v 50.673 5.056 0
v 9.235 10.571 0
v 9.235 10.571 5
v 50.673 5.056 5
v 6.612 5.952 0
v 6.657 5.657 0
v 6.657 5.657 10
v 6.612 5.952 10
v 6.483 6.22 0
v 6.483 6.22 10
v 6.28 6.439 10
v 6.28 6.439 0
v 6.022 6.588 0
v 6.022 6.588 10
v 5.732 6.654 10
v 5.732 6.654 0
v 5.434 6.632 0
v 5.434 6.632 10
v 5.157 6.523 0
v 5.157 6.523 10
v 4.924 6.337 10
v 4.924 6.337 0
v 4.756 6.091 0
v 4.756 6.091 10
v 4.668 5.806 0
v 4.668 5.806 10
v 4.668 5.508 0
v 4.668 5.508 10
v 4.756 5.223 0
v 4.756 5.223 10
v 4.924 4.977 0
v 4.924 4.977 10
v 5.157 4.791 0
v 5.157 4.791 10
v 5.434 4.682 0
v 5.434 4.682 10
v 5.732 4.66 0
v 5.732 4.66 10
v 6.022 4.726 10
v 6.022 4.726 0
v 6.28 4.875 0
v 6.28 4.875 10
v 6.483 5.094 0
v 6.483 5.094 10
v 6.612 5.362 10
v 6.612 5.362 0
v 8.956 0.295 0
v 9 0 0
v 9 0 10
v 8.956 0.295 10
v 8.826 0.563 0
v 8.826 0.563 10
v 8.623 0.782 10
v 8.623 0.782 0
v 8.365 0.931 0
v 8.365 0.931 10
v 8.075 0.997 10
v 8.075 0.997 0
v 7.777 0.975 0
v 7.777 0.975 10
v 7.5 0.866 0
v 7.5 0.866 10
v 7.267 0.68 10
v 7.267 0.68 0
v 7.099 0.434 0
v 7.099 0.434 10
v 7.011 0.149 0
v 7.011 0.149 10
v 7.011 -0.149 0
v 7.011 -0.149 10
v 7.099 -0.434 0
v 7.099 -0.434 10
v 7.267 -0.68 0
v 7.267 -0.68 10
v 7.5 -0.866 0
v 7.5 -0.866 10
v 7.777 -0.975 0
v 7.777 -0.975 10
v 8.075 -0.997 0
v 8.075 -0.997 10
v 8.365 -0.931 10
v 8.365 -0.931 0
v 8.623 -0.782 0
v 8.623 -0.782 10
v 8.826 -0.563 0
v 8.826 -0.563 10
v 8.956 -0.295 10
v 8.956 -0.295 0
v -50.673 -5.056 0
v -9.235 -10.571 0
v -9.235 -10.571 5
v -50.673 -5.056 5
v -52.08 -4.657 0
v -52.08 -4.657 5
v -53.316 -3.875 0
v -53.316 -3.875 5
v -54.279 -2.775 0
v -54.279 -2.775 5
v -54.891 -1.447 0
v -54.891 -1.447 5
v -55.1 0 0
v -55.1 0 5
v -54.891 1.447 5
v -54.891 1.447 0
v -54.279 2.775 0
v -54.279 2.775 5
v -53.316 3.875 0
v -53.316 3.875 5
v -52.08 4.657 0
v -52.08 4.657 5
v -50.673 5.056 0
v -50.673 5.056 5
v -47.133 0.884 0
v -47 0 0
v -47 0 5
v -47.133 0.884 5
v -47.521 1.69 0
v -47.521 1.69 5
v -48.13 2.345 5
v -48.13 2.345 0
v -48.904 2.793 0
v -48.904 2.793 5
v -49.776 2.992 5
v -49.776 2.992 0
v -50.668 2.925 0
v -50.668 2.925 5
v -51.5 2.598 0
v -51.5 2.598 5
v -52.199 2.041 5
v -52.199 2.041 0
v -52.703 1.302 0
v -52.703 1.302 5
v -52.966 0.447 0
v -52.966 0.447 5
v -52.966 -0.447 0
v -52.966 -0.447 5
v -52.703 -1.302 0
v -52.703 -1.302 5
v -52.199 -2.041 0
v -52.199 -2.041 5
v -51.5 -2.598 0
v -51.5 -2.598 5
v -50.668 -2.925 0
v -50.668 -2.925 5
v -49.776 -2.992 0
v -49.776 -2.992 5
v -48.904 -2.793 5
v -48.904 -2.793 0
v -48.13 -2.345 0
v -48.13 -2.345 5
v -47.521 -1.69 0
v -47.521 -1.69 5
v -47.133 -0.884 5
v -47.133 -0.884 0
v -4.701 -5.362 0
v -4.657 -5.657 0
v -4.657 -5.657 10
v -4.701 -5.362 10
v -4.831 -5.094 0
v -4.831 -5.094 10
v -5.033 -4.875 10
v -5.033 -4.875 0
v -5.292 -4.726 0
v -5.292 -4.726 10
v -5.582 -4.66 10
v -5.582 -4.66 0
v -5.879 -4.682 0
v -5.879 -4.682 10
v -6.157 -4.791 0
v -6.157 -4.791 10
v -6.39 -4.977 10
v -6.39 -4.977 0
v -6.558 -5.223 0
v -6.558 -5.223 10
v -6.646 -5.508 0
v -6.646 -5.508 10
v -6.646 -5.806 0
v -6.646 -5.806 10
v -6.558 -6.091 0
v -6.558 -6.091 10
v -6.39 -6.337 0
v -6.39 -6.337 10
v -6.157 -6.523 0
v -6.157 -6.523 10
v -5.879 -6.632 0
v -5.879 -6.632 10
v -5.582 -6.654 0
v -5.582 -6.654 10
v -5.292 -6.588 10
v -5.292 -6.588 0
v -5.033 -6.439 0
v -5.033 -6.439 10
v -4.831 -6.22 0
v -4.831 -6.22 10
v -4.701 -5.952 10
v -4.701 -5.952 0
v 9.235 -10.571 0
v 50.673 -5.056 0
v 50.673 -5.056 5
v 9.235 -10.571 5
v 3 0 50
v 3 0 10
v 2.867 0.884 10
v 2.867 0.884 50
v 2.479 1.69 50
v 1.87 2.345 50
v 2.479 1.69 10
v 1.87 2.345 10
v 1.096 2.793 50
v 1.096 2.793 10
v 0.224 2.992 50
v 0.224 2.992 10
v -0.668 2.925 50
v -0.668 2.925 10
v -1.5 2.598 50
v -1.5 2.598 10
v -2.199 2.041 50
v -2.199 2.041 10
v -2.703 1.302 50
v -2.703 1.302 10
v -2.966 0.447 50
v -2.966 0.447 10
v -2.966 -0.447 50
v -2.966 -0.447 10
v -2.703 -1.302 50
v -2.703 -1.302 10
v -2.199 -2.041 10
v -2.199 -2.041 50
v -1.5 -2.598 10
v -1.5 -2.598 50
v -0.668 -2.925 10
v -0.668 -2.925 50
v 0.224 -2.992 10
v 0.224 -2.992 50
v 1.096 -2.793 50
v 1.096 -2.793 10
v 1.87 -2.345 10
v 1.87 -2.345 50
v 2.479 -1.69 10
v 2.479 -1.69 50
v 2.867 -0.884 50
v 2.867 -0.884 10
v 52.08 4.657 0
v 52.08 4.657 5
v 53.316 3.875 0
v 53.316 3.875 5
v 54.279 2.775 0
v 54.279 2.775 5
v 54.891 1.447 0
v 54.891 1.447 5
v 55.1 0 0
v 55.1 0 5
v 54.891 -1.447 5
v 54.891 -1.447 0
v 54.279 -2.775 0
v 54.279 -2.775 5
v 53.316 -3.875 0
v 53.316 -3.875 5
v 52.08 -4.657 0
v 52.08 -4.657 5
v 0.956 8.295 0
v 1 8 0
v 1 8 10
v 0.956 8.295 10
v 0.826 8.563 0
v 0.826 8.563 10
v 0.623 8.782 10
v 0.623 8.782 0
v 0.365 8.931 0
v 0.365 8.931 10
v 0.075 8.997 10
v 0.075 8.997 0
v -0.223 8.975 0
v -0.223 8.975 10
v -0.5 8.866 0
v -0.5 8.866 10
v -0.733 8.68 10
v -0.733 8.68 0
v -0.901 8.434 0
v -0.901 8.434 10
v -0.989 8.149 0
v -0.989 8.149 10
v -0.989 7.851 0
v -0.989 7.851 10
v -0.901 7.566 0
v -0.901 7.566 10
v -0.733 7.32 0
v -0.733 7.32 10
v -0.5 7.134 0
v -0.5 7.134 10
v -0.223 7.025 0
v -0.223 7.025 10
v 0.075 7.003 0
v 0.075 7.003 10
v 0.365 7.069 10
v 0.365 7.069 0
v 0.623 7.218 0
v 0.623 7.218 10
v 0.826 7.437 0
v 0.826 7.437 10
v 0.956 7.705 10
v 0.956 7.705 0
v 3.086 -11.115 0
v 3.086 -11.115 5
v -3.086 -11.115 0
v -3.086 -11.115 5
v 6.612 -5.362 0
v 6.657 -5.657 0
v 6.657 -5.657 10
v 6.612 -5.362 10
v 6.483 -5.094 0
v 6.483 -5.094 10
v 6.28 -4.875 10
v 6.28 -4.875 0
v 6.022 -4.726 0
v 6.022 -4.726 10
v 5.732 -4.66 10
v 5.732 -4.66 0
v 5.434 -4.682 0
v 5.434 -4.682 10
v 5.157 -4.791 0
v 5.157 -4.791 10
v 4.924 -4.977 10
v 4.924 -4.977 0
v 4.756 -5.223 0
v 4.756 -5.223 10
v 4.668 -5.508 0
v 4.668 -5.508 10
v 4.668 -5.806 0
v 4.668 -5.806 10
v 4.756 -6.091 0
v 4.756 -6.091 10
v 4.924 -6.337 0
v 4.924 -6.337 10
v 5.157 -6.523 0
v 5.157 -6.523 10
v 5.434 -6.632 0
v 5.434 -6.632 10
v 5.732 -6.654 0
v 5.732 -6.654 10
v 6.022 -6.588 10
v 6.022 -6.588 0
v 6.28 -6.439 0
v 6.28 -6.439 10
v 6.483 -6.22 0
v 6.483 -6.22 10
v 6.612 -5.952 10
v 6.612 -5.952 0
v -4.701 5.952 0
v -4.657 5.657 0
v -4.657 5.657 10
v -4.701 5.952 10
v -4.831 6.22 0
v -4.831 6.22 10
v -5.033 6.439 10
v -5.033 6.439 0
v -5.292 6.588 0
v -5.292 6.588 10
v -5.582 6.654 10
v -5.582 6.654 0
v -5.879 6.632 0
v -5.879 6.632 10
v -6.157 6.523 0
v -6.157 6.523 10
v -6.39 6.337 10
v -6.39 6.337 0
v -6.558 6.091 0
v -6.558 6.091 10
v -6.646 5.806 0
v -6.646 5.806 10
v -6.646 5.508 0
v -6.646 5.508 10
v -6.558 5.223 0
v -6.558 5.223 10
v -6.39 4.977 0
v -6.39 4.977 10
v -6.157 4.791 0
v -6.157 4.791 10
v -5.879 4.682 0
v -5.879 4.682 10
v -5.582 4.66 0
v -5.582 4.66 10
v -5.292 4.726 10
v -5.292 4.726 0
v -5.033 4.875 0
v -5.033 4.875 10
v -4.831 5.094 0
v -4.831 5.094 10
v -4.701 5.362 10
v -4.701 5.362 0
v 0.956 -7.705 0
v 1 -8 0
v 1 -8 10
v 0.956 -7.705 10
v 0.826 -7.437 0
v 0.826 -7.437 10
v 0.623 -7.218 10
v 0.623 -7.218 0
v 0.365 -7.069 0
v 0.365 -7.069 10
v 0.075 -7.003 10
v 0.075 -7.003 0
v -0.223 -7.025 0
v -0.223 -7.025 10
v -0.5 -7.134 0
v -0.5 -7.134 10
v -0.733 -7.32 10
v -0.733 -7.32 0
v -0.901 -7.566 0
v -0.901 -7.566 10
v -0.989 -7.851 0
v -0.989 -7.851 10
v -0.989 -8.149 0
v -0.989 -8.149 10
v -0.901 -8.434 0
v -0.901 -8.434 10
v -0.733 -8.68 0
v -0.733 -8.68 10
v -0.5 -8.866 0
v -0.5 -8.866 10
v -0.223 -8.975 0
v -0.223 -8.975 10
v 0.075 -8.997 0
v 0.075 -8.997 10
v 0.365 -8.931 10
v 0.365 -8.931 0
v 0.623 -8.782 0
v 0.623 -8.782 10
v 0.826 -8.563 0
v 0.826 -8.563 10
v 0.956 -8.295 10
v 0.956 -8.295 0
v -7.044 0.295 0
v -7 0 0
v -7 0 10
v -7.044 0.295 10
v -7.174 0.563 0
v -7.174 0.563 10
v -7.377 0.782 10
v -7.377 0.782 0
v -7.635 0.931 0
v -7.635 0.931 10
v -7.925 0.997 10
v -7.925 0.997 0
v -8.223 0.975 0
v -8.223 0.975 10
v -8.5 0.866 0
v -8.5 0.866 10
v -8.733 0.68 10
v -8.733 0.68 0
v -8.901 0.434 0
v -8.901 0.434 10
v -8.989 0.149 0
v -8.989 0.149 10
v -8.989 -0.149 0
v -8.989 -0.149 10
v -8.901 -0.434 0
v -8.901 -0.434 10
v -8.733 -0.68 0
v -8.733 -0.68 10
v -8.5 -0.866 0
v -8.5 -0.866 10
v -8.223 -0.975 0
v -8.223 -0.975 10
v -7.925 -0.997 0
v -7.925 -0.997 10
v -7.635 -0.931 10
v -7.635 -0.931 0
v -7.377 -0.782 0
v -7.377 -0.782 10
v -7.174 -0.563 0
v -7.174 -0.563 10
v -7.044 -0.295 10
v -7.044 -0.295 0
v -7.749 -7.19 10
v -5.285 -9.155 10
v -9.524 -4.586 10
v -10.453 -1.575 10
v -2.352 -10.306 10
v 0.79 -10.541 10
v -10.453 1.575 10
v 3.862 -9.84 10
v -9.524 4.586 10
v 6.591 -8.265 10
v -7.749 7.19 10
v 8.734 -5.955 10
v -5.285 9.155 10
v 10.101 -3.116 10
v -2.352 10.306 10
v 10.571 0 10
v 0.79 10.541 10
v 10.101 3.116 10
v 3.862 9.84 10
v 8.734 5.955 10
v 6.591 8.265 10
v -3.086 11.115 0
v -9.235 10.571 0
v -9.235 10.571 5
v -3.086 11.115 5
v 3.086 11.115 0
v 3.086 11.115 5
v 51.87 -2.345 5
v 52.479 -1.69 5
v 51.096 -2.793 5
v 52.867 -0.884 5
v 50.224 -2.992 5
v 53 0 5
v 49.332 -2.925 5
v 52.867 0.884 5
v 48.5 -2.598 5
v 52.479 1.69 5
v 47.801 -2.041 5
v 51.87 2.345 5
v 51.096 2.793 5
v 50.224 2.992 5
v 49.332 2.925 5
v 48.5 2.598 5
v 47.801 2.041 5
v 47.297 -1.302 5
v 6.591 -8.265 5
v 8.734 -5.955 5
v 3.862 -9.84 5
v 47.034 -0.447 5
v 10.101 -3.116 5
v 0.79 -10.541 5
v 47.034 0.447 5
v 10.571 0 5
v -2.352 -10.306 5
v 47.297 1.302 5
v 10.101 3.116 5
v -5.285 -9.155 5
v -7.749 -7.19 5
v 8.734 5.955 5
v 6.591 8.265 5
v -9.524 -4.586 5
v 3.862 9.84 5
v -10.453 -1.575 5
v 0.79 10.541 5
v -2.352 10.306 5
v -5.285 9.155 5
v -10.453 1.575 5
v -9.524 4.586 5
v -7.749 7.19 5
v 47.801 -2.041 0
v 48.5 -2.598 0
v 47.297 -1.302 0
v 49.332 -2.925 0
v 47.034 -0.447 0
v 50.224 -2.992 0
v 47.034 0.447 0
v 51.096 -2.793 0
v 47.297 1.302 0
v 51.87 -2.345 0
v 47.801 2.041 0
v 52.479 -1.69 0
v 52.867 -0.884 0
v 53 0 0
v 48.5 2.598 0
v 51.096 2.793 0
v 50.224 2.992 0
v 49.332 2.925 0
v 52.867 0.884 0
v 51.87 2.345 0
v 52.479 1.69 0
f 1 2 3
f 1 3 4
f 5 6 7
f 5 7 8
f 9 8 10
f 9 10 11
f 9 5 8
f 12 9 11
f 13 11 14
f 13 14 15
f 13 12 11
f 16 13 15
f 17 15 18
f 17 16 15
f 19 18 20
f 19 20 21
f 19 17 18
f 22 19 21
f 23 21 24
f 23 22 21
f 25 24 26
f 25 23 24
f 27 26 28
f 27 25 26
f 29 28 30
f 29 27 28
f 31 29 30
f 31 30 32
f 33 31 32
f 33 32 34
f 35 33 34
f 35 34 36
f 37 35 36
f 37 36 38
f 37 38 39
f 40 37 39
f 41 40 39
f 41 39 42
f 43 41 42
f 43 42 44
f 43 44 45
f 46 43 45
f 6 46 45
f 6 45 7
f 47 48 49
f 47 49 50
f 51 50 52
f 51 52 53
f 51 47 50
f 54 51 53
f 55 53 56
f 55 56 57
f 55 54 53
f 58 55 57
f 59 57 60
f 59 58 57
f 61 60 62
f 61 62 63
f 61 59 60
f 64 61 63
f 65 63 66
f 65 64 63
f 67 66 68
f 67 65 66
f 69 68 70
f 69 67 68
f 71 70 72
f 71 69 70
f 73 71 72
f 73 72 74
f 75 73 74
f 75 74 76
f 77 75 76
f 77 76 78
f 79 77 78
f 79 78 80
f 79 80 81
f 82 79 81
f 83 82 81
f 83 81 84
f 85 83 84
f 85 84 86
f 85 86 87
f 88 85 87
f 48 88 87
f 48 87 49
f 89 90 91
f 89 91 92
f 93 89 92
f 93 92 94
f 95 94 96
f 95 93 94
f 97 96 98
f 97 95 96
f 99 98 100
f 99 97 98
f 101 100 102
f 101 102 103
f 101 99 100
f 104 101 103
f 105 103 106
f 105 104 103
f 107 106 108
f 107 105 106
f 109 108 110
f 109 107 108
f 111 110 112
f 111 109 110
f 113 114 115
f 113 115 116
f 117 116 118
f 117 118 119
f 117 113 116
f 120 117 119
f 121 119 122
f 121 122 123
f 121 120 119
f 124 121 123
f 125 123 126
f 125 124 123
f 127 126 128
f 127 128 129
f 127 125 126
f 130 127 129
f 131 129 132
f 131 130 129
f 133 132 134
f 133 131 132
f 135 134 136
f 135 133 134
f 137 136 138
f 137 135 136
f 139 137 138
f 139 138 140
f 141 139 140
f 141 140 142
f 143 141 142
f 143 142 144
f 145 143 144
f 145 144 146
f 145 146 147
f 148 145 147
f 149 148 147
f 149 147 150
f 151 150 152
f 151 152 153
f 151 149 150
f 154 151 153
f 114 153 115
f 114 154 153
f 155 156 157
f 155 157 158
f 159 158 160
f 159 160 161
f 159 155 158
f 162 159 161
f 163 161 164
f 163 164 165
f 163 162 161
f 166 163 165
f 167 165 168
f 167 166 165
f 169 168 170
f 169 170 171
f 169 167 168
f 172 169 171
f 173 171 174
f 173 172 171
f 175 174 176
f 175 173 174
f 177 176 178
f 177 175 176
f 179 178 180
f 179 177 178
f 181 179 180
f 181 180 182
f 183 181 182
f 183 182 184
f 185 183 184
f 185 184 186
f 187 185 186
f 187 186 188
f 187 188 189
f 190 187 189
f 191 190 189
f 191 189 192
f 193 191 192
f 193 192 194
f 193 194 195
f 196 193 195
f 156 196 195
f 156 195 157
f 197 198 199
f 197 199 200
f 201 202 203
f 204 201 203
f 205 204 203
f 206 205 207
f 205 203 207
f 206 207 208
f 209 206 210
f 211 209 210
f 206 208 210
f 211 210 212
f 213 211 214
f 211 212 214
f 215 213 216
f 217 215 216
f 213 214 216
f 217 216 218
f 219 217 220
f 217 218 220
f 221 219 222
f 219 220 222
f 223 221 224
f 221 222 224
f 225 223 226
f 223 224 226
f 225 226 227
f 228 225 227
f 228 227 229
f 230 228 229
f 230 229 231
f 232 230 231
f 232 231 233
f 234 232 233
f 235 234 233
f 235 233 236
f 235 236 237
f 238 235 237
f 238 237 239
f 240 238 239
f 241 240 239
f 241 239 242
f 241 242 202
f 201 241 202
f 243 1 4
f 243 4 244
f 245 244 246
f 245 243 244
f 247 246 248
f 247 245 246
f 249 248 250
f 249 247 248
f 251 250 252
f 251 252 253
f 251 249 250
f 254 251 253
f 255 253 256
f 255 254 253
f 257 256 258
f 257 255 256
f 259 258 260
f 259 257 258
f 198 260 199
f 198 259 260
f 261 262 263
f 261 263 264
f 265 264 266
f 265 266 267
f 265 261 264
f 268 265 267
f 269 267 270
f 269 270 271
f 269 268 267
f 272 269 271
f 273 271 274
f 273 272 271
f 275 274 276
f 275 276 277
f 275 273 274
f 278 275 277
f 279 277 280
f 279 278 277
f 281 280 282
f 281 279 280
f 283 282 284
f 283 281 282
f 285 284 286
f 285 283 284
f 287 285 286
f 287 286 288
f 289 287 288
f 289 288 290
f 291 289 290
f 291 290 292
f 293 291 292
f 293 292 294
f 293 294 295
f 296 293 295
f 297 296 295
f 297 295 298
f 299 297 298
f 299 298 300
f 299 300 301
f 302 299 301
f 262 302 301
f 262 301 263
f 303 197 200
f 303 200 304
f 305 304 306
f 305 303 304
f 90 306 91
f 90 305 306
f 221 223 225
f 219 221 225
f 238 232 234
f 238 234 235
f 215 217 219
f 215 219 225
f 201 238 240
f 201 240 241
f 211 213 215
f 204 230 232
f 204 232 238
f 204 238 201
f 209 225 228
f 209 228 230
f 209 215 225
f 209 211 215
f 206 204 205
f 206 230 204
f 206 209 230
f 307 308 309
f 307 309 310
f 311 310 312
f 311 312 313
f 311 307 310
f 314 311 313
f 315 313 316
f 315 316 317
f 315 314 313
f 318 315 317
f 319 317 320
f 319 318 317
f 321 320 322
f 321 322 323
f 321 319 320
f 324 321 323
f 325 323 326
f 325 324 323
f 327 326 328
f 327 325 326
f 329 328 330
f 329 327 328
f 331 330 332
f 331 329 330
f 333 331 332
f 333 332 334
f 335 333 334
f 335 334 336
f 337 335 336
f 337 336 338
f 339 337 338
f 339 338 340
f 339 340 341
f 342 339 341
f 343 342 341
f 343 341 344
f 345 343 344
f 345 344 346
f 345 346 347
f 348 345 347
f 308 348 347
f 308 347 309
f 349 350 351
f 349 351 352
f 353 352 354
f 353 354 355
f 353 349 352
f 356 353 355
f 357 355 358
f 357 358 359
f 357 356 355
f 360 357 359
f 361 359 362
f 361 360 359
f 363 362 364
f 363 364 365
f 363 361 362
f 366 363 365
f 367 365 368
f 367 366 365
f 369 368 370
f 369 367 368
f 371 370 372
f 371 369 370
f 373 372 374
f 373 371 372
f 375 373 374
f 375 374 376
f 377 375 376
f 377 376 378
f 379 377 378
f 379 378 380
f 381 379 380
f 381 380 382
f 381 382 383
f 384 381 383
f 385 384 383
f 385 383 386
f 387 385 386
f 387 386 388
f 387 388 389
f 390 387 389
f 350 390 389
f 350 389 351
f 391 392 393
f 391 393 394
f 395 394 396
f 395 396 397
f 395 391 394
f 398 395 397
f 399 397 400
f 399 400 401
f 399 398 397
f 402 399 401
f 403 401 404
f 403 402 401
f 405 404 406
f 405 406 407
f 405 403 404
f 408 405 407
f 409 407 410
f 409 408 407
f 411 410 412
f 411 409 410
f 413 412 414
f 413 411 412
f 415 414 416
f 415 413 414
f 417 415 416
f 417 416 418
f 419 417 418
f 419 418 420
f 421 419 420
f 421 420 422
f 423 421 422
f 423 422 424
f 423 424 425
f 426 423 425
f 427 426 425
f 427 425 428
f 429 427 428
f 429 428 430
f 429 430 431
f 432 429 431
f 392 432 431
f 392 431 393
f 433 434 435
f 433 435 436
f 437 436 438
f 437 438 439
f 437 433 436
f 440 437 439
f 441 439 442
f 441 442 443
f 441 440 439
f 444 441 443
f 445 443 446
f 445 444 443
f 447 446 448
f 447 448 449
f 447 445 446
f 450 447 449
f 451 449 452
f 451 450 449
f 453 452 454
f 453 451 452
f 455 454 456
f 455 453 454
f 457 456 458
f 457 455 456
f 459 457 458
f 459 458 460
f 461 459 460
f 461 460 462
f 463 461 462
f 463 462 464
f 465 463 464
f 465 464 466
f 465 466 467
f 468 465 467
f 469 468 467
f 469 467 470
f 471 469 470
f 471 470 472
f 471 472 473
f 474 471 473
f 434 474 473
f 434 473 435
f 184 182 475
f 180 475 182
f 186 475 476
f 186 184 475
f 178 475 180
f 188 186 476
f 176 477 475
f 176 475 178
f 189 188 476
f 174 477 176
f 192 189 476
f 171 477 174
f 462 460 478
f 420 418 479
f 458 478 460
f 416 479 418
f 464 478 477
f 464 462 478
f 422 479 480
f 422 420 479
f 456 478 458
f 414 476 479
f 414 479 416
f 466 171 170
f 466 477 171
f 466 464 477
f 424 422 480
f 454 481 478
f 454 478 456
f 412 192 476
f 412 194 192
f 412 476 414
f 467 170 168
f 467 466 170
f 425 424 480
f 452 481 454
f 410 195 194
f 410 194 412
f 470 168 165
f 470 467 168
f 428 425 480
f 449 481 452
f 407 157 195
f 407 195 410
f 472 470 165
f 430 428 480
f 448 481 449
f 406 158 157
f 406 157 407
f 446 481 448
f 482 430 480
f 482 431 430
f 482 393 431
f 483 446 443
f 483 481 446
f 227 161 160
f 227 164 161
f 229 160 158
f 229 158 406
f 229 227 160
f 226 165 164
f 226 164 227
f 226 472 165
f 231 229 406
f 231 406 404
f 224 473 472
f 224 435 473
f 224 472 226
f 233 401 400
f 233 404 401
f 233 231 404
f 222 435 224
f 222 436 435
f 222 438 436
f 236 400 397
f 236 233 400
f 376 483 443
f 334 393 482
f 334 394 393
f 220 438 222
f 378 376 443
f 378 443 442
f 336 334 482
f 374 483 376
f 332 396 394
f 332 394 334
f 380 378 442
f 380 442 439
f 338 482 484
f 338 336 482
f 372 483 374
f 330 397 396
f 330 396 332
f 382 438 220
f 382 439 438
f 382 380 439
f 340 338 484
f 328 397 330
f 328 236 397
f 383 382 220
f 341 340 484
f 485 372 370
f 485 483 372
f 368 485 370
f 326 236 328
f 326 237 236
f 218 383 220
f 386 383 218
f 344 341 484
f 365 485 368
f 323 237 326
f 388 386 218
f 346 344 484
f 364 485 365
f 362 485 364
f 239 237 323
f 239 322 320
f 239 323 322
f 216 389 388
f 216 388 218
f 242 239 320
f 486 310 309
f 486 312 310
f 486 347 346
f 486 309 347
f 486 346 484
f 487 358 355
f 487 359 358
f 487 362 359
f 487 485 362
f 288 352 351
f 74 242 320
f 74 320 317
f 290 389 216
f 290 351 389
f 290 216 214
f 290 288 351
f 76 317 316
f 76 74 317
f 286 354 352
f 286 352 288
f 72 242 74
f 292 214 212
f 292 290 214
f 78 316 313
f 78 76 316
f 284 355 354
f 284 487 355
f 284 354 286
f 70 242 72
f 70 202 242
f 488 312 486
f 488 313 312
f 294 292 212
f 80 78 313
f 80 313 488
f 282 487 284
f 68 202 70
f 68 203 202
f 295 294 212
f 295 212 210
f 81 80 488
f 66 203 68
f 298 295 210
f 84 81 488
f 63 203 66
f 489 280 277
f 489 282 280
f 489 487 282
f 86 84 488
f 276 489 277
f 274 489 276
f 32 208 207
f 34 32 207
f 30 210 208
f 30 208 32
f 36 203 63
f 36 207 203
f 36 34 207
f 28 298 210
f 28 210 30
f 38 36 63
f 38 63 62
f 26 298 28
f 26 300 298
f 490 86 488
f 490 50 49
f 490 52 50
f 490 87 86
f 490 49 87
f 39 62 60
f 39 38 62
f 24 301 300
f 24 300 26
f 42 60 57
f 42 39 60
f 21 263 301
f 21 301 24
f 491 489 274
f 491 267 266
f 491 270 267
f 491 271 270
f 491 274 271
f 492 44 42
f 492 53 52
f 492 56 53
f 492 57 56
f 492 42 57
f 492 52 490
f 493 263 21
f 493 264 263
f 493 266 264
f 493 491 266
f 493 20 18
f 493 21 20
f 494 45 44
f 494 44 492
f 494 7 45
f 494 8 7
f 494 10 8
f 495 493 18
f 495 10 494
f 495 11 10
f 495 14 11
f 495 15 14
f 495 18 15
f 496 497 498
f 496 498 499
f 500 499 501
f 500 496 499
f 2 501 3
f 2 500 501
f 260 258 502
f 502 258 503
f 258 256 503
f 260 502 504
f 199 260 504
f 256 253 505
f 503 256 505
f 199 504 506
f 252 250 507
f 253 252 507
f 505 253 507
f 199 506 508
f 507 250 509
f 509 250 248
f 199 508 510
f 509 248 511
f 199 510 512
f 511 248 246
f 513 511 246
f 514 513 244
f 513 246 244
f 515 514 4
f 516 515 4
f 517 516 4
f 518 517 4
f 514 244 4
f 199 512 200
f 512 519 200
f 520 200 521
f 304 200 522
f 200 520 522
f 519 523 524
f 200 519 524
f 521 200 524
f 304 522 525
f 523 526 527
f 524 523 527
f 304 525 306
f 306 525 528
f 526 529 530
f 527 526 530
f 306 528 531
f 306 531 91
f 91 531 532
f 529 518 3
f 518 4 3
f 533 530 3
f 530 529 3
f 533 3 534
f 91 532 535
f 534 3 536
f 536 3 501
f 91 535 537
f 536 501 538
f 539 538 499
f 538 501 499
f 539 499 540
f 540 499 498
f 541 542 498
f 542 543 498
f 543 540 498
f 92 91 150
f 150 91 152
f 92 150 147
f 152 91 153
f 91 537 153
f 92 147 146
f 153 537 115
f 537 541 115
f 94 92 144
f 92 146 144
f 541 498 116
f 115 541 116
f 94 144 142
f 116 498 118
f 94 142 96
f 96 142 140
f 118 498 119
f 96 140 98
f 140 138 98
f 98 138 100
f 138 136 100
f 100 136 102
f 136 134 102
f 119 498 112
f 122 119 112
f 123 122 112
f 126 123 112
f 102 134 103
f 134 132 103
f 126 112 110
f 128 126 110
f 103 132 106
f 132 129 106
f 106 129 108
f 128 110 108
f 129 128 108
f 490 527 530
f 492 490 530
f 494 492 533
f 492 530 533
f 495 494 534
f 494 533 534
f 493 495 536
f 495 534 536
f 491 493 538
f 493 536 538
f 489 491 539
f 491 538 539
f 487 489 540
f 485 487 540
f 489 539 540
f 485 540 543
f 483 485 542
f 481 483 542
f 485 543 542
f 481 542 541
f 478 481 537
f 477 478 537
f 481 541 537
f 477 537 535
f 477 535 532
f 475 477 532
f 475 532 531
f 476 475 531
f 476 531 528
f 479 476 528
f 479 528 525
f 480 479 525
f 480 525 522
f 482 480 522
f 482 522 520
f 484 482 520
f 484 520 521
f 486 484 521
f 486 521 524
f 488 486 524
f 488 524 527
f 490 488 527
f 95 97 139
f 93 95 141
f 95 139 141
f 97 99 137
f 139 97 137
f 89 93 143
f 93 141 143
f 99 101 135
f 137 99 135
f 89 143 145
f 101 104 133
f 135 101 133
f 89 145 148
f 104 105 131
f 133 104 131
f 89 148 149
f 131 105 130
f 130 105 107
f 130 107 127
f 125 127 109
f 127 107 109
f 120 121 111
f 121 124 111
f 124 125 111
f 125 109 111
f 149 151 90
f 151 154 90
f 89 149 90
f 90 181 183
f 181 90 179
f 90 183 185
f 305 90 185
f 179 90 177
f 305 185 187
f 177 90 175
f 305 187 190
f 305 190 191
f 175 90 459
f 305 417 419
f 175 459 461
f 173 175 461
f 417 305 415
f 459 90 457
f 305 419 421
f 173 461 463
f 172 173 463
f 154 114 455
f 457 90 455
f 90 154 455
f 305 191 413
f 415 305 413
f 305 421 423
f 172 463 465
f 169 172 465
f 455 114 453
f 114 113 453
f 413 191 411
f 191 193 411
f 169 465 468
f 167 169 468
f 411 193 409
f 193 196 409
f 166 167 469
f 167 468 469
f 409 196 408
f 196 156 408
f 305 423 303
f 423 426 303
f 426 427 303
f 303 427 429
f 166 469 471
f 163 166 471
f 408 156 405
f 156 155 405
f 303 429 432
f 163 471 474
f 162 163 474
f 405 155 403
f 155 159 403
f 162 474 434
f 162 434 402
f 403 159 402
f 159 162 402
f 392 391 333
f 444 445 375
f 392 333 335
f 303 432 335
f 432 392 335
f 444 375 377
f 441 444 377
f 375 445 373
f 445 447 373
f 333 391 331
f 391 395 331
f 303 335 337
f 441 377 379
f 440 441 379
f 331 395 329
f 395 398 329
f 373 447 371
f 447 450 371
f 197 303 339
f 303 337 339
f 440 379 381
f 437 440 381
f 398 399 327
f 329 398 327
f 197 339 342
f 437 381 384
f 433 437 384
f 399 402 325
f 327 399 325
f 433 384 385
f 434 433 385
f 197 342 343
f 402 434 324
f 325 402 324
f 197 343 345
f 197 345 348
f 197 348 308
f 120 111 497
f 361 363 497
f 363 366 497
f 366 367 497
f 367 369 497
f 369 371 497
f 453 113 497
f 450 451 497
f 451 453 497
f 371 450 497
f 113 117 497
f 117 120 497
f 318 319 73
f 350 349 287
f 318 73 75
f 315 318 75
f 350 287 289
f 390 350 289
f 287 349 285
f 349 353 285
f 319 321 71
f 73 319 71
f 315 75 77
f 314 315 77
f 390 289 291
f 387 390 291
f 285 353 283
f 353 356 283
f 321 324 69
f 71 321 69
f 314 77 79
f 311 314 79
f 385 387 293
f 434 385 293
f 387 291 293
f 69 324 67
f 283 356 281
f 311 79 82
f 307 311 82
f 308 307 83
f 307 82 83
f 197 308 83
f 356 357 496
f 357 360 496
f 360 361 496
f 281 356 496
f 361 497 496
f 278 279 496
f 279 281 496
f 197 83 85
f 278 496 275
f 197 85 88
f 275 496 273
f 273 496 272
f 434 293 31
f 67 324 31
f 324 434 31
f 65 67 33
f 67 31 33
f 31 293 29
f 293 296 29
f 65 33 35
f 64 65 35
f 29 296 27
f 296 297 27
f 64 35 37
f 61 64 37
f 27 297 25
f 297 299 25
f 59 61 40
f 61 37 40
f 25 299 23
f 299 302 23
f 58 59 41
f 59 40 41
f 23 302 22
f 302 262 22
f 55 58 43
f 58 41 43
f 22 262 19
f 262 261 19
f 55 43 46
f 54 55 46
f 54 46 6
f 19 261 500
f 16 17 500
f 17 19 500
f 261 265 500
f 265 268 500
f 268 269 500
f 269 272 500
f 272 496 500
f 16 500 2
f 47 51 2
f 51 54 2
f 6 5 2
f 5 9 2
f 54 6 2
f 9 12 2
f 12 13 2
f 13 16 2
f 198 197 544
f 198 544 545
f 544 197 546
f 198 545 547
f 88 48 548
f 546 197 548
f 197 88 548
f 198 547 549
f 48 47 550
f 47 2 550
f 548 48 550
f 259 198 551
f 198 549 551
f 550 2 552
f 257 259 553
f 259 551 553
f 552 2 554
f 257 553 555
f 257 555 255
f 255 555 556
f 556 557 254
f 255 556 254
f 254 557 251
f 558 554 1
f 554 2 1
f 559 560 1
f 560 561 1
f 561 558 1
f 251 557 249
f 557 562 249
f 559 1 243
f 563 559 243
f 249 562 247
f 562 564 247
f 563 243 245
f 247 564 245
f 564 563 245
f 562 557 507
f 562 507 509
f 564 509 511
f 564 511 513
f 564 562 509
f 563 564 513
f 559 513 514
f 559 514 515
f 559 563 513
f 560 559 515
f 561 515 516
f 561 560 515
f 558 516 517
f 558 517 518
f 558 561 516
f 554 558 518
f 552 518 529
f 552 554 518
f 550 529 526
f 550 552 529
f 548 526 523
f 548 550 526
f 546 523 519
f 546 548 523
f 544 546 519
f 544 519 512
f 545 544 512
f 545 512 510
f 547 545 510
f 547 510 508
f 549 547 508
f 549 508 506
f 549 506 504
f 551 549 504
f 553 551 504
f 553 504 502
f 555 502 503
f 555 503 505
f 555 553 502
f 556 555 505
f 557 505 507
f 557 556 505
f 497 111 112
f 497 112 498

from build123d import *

# Parameters (mm, degrees)
SZKIC1_R                    = 3
SZKIC1_R_2                  = 1
DODANIE_WYCI_GNI_CIE1_DEPTH = 5
SZKIC1_3_R                  = 10.570763761
SZKIC1_3_R_2                = 1
SZKIC1_3_R_3                = 3
DODANIE_WYCI_GNI_CIE2_DEPTH = 10
SZKIC1_4_R                  = 3
DODANIE_WYCI_GNI_CIE3_DEPTH = 50


with BuildPart() as part:
    # Szkic1 → Dodanie-wyci_gni_cie1 (new body)
    with BuildSketch(Plane.XY):
        with BuildLine():
            Line((-9.235111676, 10.570763761), (-50.67287635, 5.055665151))
            ThreePointArc((-50.67287635, 5.055665151), (-55.100246338, 0), (-50.67287635, -5.055665151))
            Line((-50.67287635, -5.055665151), (-9.235111676, -10.570763761))
            ThreePointArc((-9.235111676, -10.570763761), (0, -11.182632843), (9.235111676, -10.570763761))
            Line((9.235111676, -10.570763761), (50.67287635, -5.055665151))
            ThreePointArc((50.67287635, -5.055665151), (55.100246338, 0), (50.67287635, 5.055665151))
            Line((50.67287635, 5.055665151), (9.235111676, 10.570763761))
            ThreePointArc((9.235111676, 10.570763761), (0, 11.182632843), (-9.235111676, 10.570763761))
        make_face()
        with Locations((-50, 0)):
            Circle(SZKIC1_R, mode=Mode.SUBTRACT)
        with Locations((50, 0)):
            Circle(SZKIC1_R, mode=Mode.SUBTRACT)
        with Locations((0, 8)):
            Circle(SZKIC1_R_2, mode=Mode.SUBTRACT)
        with Locations((0, -8)):
            Circle(SZKIC1_R_2, mode=Mode.SUBTRACT)
        with Locations((-5.656854249, -5.656854249)):
            Circle(SZKIC1_R_2, mode=Mode.SUBTRACT)
        with Locations((-8, 0)):
            Circle(SZKIC1_R_2, mode=Mode.SUBTRACT)
        with Locations((5.656854249, -5.656854249)):
            Circle(SZKIC1_R_2, mode=Mode.SUBTRACT)
        with Locations((8, 0)):
            Circle(SZKIC1_R_2, mode=Mode.SUBTRACT)
        with Locations((-5.656854249, 5.656854249)):
            Circle(SZKIC1_R_2, mode=Mode.SUBTRACT)
        with Locations((5.656854249, 5.656854249)):
            Circle(SZKIC1_R_2, mode=Mode.SUBTRACT)
    extrude(amount=DODANIE_WYCI_GNI_CIE1_DEPTH)

    # Szkic1_3 → Dodanie-wyci_gni_cie2 (add)
    with BuildSketch(Plane.XY):
        Circle(SZKIC1_3_R)
        with Locations((0, -8)):
            Circle(SZKIC1_3_R_2, mode=Mode.SUBTRACT)
        with Locations((-5.656854249, -5.656854249)):
            Circle(SZKIC1_3_R_2, mode=Mode.SUBTRACT)
        with Locations((-8, 0)):
            Circle(SZKIC1_3_R_2, mode=Mode.SUBTRACT)
        Circle(SZKIC1_3_R_3, mode=Mode.SUBTRACT)
        with Locations((5.656854249, -5.656854249)):
            Circle(SZKIC1_3_R_2, mode=Mode.SUBTRACT)
        with Locations((8, 0)):
            Circle(SZKIC1_3_R_2, mode=Mode.SUBTRACT)
        with Locations((-5.656854249, 5.656854249)):
            Circle(SZKIC1_3_R_2, mode=Mode.SUBTRACT)
        with Locations((5.656854249, 5.656854249)):
            Circle(SZKIC1_3_R_2, mode=Mode.SUBTRACT)
        with Locations((0, 8)):
            Circle(SZKIC1_3_R_2, mode=Mode.SUBTRACT)
    extrude(amount=DODANIE_WYCI_GNI_CIE2_DEPTH)

    # Szkic1_4 → Dodanie-wyci_gni_cie3 (add)
    with BuildSketch(Plane.XY):
        Circle(SZKIC1_4_R)
    extrude(amount=DODANIE_WYCI_GNI_CIE3_DEPTH)


solid = part.part
